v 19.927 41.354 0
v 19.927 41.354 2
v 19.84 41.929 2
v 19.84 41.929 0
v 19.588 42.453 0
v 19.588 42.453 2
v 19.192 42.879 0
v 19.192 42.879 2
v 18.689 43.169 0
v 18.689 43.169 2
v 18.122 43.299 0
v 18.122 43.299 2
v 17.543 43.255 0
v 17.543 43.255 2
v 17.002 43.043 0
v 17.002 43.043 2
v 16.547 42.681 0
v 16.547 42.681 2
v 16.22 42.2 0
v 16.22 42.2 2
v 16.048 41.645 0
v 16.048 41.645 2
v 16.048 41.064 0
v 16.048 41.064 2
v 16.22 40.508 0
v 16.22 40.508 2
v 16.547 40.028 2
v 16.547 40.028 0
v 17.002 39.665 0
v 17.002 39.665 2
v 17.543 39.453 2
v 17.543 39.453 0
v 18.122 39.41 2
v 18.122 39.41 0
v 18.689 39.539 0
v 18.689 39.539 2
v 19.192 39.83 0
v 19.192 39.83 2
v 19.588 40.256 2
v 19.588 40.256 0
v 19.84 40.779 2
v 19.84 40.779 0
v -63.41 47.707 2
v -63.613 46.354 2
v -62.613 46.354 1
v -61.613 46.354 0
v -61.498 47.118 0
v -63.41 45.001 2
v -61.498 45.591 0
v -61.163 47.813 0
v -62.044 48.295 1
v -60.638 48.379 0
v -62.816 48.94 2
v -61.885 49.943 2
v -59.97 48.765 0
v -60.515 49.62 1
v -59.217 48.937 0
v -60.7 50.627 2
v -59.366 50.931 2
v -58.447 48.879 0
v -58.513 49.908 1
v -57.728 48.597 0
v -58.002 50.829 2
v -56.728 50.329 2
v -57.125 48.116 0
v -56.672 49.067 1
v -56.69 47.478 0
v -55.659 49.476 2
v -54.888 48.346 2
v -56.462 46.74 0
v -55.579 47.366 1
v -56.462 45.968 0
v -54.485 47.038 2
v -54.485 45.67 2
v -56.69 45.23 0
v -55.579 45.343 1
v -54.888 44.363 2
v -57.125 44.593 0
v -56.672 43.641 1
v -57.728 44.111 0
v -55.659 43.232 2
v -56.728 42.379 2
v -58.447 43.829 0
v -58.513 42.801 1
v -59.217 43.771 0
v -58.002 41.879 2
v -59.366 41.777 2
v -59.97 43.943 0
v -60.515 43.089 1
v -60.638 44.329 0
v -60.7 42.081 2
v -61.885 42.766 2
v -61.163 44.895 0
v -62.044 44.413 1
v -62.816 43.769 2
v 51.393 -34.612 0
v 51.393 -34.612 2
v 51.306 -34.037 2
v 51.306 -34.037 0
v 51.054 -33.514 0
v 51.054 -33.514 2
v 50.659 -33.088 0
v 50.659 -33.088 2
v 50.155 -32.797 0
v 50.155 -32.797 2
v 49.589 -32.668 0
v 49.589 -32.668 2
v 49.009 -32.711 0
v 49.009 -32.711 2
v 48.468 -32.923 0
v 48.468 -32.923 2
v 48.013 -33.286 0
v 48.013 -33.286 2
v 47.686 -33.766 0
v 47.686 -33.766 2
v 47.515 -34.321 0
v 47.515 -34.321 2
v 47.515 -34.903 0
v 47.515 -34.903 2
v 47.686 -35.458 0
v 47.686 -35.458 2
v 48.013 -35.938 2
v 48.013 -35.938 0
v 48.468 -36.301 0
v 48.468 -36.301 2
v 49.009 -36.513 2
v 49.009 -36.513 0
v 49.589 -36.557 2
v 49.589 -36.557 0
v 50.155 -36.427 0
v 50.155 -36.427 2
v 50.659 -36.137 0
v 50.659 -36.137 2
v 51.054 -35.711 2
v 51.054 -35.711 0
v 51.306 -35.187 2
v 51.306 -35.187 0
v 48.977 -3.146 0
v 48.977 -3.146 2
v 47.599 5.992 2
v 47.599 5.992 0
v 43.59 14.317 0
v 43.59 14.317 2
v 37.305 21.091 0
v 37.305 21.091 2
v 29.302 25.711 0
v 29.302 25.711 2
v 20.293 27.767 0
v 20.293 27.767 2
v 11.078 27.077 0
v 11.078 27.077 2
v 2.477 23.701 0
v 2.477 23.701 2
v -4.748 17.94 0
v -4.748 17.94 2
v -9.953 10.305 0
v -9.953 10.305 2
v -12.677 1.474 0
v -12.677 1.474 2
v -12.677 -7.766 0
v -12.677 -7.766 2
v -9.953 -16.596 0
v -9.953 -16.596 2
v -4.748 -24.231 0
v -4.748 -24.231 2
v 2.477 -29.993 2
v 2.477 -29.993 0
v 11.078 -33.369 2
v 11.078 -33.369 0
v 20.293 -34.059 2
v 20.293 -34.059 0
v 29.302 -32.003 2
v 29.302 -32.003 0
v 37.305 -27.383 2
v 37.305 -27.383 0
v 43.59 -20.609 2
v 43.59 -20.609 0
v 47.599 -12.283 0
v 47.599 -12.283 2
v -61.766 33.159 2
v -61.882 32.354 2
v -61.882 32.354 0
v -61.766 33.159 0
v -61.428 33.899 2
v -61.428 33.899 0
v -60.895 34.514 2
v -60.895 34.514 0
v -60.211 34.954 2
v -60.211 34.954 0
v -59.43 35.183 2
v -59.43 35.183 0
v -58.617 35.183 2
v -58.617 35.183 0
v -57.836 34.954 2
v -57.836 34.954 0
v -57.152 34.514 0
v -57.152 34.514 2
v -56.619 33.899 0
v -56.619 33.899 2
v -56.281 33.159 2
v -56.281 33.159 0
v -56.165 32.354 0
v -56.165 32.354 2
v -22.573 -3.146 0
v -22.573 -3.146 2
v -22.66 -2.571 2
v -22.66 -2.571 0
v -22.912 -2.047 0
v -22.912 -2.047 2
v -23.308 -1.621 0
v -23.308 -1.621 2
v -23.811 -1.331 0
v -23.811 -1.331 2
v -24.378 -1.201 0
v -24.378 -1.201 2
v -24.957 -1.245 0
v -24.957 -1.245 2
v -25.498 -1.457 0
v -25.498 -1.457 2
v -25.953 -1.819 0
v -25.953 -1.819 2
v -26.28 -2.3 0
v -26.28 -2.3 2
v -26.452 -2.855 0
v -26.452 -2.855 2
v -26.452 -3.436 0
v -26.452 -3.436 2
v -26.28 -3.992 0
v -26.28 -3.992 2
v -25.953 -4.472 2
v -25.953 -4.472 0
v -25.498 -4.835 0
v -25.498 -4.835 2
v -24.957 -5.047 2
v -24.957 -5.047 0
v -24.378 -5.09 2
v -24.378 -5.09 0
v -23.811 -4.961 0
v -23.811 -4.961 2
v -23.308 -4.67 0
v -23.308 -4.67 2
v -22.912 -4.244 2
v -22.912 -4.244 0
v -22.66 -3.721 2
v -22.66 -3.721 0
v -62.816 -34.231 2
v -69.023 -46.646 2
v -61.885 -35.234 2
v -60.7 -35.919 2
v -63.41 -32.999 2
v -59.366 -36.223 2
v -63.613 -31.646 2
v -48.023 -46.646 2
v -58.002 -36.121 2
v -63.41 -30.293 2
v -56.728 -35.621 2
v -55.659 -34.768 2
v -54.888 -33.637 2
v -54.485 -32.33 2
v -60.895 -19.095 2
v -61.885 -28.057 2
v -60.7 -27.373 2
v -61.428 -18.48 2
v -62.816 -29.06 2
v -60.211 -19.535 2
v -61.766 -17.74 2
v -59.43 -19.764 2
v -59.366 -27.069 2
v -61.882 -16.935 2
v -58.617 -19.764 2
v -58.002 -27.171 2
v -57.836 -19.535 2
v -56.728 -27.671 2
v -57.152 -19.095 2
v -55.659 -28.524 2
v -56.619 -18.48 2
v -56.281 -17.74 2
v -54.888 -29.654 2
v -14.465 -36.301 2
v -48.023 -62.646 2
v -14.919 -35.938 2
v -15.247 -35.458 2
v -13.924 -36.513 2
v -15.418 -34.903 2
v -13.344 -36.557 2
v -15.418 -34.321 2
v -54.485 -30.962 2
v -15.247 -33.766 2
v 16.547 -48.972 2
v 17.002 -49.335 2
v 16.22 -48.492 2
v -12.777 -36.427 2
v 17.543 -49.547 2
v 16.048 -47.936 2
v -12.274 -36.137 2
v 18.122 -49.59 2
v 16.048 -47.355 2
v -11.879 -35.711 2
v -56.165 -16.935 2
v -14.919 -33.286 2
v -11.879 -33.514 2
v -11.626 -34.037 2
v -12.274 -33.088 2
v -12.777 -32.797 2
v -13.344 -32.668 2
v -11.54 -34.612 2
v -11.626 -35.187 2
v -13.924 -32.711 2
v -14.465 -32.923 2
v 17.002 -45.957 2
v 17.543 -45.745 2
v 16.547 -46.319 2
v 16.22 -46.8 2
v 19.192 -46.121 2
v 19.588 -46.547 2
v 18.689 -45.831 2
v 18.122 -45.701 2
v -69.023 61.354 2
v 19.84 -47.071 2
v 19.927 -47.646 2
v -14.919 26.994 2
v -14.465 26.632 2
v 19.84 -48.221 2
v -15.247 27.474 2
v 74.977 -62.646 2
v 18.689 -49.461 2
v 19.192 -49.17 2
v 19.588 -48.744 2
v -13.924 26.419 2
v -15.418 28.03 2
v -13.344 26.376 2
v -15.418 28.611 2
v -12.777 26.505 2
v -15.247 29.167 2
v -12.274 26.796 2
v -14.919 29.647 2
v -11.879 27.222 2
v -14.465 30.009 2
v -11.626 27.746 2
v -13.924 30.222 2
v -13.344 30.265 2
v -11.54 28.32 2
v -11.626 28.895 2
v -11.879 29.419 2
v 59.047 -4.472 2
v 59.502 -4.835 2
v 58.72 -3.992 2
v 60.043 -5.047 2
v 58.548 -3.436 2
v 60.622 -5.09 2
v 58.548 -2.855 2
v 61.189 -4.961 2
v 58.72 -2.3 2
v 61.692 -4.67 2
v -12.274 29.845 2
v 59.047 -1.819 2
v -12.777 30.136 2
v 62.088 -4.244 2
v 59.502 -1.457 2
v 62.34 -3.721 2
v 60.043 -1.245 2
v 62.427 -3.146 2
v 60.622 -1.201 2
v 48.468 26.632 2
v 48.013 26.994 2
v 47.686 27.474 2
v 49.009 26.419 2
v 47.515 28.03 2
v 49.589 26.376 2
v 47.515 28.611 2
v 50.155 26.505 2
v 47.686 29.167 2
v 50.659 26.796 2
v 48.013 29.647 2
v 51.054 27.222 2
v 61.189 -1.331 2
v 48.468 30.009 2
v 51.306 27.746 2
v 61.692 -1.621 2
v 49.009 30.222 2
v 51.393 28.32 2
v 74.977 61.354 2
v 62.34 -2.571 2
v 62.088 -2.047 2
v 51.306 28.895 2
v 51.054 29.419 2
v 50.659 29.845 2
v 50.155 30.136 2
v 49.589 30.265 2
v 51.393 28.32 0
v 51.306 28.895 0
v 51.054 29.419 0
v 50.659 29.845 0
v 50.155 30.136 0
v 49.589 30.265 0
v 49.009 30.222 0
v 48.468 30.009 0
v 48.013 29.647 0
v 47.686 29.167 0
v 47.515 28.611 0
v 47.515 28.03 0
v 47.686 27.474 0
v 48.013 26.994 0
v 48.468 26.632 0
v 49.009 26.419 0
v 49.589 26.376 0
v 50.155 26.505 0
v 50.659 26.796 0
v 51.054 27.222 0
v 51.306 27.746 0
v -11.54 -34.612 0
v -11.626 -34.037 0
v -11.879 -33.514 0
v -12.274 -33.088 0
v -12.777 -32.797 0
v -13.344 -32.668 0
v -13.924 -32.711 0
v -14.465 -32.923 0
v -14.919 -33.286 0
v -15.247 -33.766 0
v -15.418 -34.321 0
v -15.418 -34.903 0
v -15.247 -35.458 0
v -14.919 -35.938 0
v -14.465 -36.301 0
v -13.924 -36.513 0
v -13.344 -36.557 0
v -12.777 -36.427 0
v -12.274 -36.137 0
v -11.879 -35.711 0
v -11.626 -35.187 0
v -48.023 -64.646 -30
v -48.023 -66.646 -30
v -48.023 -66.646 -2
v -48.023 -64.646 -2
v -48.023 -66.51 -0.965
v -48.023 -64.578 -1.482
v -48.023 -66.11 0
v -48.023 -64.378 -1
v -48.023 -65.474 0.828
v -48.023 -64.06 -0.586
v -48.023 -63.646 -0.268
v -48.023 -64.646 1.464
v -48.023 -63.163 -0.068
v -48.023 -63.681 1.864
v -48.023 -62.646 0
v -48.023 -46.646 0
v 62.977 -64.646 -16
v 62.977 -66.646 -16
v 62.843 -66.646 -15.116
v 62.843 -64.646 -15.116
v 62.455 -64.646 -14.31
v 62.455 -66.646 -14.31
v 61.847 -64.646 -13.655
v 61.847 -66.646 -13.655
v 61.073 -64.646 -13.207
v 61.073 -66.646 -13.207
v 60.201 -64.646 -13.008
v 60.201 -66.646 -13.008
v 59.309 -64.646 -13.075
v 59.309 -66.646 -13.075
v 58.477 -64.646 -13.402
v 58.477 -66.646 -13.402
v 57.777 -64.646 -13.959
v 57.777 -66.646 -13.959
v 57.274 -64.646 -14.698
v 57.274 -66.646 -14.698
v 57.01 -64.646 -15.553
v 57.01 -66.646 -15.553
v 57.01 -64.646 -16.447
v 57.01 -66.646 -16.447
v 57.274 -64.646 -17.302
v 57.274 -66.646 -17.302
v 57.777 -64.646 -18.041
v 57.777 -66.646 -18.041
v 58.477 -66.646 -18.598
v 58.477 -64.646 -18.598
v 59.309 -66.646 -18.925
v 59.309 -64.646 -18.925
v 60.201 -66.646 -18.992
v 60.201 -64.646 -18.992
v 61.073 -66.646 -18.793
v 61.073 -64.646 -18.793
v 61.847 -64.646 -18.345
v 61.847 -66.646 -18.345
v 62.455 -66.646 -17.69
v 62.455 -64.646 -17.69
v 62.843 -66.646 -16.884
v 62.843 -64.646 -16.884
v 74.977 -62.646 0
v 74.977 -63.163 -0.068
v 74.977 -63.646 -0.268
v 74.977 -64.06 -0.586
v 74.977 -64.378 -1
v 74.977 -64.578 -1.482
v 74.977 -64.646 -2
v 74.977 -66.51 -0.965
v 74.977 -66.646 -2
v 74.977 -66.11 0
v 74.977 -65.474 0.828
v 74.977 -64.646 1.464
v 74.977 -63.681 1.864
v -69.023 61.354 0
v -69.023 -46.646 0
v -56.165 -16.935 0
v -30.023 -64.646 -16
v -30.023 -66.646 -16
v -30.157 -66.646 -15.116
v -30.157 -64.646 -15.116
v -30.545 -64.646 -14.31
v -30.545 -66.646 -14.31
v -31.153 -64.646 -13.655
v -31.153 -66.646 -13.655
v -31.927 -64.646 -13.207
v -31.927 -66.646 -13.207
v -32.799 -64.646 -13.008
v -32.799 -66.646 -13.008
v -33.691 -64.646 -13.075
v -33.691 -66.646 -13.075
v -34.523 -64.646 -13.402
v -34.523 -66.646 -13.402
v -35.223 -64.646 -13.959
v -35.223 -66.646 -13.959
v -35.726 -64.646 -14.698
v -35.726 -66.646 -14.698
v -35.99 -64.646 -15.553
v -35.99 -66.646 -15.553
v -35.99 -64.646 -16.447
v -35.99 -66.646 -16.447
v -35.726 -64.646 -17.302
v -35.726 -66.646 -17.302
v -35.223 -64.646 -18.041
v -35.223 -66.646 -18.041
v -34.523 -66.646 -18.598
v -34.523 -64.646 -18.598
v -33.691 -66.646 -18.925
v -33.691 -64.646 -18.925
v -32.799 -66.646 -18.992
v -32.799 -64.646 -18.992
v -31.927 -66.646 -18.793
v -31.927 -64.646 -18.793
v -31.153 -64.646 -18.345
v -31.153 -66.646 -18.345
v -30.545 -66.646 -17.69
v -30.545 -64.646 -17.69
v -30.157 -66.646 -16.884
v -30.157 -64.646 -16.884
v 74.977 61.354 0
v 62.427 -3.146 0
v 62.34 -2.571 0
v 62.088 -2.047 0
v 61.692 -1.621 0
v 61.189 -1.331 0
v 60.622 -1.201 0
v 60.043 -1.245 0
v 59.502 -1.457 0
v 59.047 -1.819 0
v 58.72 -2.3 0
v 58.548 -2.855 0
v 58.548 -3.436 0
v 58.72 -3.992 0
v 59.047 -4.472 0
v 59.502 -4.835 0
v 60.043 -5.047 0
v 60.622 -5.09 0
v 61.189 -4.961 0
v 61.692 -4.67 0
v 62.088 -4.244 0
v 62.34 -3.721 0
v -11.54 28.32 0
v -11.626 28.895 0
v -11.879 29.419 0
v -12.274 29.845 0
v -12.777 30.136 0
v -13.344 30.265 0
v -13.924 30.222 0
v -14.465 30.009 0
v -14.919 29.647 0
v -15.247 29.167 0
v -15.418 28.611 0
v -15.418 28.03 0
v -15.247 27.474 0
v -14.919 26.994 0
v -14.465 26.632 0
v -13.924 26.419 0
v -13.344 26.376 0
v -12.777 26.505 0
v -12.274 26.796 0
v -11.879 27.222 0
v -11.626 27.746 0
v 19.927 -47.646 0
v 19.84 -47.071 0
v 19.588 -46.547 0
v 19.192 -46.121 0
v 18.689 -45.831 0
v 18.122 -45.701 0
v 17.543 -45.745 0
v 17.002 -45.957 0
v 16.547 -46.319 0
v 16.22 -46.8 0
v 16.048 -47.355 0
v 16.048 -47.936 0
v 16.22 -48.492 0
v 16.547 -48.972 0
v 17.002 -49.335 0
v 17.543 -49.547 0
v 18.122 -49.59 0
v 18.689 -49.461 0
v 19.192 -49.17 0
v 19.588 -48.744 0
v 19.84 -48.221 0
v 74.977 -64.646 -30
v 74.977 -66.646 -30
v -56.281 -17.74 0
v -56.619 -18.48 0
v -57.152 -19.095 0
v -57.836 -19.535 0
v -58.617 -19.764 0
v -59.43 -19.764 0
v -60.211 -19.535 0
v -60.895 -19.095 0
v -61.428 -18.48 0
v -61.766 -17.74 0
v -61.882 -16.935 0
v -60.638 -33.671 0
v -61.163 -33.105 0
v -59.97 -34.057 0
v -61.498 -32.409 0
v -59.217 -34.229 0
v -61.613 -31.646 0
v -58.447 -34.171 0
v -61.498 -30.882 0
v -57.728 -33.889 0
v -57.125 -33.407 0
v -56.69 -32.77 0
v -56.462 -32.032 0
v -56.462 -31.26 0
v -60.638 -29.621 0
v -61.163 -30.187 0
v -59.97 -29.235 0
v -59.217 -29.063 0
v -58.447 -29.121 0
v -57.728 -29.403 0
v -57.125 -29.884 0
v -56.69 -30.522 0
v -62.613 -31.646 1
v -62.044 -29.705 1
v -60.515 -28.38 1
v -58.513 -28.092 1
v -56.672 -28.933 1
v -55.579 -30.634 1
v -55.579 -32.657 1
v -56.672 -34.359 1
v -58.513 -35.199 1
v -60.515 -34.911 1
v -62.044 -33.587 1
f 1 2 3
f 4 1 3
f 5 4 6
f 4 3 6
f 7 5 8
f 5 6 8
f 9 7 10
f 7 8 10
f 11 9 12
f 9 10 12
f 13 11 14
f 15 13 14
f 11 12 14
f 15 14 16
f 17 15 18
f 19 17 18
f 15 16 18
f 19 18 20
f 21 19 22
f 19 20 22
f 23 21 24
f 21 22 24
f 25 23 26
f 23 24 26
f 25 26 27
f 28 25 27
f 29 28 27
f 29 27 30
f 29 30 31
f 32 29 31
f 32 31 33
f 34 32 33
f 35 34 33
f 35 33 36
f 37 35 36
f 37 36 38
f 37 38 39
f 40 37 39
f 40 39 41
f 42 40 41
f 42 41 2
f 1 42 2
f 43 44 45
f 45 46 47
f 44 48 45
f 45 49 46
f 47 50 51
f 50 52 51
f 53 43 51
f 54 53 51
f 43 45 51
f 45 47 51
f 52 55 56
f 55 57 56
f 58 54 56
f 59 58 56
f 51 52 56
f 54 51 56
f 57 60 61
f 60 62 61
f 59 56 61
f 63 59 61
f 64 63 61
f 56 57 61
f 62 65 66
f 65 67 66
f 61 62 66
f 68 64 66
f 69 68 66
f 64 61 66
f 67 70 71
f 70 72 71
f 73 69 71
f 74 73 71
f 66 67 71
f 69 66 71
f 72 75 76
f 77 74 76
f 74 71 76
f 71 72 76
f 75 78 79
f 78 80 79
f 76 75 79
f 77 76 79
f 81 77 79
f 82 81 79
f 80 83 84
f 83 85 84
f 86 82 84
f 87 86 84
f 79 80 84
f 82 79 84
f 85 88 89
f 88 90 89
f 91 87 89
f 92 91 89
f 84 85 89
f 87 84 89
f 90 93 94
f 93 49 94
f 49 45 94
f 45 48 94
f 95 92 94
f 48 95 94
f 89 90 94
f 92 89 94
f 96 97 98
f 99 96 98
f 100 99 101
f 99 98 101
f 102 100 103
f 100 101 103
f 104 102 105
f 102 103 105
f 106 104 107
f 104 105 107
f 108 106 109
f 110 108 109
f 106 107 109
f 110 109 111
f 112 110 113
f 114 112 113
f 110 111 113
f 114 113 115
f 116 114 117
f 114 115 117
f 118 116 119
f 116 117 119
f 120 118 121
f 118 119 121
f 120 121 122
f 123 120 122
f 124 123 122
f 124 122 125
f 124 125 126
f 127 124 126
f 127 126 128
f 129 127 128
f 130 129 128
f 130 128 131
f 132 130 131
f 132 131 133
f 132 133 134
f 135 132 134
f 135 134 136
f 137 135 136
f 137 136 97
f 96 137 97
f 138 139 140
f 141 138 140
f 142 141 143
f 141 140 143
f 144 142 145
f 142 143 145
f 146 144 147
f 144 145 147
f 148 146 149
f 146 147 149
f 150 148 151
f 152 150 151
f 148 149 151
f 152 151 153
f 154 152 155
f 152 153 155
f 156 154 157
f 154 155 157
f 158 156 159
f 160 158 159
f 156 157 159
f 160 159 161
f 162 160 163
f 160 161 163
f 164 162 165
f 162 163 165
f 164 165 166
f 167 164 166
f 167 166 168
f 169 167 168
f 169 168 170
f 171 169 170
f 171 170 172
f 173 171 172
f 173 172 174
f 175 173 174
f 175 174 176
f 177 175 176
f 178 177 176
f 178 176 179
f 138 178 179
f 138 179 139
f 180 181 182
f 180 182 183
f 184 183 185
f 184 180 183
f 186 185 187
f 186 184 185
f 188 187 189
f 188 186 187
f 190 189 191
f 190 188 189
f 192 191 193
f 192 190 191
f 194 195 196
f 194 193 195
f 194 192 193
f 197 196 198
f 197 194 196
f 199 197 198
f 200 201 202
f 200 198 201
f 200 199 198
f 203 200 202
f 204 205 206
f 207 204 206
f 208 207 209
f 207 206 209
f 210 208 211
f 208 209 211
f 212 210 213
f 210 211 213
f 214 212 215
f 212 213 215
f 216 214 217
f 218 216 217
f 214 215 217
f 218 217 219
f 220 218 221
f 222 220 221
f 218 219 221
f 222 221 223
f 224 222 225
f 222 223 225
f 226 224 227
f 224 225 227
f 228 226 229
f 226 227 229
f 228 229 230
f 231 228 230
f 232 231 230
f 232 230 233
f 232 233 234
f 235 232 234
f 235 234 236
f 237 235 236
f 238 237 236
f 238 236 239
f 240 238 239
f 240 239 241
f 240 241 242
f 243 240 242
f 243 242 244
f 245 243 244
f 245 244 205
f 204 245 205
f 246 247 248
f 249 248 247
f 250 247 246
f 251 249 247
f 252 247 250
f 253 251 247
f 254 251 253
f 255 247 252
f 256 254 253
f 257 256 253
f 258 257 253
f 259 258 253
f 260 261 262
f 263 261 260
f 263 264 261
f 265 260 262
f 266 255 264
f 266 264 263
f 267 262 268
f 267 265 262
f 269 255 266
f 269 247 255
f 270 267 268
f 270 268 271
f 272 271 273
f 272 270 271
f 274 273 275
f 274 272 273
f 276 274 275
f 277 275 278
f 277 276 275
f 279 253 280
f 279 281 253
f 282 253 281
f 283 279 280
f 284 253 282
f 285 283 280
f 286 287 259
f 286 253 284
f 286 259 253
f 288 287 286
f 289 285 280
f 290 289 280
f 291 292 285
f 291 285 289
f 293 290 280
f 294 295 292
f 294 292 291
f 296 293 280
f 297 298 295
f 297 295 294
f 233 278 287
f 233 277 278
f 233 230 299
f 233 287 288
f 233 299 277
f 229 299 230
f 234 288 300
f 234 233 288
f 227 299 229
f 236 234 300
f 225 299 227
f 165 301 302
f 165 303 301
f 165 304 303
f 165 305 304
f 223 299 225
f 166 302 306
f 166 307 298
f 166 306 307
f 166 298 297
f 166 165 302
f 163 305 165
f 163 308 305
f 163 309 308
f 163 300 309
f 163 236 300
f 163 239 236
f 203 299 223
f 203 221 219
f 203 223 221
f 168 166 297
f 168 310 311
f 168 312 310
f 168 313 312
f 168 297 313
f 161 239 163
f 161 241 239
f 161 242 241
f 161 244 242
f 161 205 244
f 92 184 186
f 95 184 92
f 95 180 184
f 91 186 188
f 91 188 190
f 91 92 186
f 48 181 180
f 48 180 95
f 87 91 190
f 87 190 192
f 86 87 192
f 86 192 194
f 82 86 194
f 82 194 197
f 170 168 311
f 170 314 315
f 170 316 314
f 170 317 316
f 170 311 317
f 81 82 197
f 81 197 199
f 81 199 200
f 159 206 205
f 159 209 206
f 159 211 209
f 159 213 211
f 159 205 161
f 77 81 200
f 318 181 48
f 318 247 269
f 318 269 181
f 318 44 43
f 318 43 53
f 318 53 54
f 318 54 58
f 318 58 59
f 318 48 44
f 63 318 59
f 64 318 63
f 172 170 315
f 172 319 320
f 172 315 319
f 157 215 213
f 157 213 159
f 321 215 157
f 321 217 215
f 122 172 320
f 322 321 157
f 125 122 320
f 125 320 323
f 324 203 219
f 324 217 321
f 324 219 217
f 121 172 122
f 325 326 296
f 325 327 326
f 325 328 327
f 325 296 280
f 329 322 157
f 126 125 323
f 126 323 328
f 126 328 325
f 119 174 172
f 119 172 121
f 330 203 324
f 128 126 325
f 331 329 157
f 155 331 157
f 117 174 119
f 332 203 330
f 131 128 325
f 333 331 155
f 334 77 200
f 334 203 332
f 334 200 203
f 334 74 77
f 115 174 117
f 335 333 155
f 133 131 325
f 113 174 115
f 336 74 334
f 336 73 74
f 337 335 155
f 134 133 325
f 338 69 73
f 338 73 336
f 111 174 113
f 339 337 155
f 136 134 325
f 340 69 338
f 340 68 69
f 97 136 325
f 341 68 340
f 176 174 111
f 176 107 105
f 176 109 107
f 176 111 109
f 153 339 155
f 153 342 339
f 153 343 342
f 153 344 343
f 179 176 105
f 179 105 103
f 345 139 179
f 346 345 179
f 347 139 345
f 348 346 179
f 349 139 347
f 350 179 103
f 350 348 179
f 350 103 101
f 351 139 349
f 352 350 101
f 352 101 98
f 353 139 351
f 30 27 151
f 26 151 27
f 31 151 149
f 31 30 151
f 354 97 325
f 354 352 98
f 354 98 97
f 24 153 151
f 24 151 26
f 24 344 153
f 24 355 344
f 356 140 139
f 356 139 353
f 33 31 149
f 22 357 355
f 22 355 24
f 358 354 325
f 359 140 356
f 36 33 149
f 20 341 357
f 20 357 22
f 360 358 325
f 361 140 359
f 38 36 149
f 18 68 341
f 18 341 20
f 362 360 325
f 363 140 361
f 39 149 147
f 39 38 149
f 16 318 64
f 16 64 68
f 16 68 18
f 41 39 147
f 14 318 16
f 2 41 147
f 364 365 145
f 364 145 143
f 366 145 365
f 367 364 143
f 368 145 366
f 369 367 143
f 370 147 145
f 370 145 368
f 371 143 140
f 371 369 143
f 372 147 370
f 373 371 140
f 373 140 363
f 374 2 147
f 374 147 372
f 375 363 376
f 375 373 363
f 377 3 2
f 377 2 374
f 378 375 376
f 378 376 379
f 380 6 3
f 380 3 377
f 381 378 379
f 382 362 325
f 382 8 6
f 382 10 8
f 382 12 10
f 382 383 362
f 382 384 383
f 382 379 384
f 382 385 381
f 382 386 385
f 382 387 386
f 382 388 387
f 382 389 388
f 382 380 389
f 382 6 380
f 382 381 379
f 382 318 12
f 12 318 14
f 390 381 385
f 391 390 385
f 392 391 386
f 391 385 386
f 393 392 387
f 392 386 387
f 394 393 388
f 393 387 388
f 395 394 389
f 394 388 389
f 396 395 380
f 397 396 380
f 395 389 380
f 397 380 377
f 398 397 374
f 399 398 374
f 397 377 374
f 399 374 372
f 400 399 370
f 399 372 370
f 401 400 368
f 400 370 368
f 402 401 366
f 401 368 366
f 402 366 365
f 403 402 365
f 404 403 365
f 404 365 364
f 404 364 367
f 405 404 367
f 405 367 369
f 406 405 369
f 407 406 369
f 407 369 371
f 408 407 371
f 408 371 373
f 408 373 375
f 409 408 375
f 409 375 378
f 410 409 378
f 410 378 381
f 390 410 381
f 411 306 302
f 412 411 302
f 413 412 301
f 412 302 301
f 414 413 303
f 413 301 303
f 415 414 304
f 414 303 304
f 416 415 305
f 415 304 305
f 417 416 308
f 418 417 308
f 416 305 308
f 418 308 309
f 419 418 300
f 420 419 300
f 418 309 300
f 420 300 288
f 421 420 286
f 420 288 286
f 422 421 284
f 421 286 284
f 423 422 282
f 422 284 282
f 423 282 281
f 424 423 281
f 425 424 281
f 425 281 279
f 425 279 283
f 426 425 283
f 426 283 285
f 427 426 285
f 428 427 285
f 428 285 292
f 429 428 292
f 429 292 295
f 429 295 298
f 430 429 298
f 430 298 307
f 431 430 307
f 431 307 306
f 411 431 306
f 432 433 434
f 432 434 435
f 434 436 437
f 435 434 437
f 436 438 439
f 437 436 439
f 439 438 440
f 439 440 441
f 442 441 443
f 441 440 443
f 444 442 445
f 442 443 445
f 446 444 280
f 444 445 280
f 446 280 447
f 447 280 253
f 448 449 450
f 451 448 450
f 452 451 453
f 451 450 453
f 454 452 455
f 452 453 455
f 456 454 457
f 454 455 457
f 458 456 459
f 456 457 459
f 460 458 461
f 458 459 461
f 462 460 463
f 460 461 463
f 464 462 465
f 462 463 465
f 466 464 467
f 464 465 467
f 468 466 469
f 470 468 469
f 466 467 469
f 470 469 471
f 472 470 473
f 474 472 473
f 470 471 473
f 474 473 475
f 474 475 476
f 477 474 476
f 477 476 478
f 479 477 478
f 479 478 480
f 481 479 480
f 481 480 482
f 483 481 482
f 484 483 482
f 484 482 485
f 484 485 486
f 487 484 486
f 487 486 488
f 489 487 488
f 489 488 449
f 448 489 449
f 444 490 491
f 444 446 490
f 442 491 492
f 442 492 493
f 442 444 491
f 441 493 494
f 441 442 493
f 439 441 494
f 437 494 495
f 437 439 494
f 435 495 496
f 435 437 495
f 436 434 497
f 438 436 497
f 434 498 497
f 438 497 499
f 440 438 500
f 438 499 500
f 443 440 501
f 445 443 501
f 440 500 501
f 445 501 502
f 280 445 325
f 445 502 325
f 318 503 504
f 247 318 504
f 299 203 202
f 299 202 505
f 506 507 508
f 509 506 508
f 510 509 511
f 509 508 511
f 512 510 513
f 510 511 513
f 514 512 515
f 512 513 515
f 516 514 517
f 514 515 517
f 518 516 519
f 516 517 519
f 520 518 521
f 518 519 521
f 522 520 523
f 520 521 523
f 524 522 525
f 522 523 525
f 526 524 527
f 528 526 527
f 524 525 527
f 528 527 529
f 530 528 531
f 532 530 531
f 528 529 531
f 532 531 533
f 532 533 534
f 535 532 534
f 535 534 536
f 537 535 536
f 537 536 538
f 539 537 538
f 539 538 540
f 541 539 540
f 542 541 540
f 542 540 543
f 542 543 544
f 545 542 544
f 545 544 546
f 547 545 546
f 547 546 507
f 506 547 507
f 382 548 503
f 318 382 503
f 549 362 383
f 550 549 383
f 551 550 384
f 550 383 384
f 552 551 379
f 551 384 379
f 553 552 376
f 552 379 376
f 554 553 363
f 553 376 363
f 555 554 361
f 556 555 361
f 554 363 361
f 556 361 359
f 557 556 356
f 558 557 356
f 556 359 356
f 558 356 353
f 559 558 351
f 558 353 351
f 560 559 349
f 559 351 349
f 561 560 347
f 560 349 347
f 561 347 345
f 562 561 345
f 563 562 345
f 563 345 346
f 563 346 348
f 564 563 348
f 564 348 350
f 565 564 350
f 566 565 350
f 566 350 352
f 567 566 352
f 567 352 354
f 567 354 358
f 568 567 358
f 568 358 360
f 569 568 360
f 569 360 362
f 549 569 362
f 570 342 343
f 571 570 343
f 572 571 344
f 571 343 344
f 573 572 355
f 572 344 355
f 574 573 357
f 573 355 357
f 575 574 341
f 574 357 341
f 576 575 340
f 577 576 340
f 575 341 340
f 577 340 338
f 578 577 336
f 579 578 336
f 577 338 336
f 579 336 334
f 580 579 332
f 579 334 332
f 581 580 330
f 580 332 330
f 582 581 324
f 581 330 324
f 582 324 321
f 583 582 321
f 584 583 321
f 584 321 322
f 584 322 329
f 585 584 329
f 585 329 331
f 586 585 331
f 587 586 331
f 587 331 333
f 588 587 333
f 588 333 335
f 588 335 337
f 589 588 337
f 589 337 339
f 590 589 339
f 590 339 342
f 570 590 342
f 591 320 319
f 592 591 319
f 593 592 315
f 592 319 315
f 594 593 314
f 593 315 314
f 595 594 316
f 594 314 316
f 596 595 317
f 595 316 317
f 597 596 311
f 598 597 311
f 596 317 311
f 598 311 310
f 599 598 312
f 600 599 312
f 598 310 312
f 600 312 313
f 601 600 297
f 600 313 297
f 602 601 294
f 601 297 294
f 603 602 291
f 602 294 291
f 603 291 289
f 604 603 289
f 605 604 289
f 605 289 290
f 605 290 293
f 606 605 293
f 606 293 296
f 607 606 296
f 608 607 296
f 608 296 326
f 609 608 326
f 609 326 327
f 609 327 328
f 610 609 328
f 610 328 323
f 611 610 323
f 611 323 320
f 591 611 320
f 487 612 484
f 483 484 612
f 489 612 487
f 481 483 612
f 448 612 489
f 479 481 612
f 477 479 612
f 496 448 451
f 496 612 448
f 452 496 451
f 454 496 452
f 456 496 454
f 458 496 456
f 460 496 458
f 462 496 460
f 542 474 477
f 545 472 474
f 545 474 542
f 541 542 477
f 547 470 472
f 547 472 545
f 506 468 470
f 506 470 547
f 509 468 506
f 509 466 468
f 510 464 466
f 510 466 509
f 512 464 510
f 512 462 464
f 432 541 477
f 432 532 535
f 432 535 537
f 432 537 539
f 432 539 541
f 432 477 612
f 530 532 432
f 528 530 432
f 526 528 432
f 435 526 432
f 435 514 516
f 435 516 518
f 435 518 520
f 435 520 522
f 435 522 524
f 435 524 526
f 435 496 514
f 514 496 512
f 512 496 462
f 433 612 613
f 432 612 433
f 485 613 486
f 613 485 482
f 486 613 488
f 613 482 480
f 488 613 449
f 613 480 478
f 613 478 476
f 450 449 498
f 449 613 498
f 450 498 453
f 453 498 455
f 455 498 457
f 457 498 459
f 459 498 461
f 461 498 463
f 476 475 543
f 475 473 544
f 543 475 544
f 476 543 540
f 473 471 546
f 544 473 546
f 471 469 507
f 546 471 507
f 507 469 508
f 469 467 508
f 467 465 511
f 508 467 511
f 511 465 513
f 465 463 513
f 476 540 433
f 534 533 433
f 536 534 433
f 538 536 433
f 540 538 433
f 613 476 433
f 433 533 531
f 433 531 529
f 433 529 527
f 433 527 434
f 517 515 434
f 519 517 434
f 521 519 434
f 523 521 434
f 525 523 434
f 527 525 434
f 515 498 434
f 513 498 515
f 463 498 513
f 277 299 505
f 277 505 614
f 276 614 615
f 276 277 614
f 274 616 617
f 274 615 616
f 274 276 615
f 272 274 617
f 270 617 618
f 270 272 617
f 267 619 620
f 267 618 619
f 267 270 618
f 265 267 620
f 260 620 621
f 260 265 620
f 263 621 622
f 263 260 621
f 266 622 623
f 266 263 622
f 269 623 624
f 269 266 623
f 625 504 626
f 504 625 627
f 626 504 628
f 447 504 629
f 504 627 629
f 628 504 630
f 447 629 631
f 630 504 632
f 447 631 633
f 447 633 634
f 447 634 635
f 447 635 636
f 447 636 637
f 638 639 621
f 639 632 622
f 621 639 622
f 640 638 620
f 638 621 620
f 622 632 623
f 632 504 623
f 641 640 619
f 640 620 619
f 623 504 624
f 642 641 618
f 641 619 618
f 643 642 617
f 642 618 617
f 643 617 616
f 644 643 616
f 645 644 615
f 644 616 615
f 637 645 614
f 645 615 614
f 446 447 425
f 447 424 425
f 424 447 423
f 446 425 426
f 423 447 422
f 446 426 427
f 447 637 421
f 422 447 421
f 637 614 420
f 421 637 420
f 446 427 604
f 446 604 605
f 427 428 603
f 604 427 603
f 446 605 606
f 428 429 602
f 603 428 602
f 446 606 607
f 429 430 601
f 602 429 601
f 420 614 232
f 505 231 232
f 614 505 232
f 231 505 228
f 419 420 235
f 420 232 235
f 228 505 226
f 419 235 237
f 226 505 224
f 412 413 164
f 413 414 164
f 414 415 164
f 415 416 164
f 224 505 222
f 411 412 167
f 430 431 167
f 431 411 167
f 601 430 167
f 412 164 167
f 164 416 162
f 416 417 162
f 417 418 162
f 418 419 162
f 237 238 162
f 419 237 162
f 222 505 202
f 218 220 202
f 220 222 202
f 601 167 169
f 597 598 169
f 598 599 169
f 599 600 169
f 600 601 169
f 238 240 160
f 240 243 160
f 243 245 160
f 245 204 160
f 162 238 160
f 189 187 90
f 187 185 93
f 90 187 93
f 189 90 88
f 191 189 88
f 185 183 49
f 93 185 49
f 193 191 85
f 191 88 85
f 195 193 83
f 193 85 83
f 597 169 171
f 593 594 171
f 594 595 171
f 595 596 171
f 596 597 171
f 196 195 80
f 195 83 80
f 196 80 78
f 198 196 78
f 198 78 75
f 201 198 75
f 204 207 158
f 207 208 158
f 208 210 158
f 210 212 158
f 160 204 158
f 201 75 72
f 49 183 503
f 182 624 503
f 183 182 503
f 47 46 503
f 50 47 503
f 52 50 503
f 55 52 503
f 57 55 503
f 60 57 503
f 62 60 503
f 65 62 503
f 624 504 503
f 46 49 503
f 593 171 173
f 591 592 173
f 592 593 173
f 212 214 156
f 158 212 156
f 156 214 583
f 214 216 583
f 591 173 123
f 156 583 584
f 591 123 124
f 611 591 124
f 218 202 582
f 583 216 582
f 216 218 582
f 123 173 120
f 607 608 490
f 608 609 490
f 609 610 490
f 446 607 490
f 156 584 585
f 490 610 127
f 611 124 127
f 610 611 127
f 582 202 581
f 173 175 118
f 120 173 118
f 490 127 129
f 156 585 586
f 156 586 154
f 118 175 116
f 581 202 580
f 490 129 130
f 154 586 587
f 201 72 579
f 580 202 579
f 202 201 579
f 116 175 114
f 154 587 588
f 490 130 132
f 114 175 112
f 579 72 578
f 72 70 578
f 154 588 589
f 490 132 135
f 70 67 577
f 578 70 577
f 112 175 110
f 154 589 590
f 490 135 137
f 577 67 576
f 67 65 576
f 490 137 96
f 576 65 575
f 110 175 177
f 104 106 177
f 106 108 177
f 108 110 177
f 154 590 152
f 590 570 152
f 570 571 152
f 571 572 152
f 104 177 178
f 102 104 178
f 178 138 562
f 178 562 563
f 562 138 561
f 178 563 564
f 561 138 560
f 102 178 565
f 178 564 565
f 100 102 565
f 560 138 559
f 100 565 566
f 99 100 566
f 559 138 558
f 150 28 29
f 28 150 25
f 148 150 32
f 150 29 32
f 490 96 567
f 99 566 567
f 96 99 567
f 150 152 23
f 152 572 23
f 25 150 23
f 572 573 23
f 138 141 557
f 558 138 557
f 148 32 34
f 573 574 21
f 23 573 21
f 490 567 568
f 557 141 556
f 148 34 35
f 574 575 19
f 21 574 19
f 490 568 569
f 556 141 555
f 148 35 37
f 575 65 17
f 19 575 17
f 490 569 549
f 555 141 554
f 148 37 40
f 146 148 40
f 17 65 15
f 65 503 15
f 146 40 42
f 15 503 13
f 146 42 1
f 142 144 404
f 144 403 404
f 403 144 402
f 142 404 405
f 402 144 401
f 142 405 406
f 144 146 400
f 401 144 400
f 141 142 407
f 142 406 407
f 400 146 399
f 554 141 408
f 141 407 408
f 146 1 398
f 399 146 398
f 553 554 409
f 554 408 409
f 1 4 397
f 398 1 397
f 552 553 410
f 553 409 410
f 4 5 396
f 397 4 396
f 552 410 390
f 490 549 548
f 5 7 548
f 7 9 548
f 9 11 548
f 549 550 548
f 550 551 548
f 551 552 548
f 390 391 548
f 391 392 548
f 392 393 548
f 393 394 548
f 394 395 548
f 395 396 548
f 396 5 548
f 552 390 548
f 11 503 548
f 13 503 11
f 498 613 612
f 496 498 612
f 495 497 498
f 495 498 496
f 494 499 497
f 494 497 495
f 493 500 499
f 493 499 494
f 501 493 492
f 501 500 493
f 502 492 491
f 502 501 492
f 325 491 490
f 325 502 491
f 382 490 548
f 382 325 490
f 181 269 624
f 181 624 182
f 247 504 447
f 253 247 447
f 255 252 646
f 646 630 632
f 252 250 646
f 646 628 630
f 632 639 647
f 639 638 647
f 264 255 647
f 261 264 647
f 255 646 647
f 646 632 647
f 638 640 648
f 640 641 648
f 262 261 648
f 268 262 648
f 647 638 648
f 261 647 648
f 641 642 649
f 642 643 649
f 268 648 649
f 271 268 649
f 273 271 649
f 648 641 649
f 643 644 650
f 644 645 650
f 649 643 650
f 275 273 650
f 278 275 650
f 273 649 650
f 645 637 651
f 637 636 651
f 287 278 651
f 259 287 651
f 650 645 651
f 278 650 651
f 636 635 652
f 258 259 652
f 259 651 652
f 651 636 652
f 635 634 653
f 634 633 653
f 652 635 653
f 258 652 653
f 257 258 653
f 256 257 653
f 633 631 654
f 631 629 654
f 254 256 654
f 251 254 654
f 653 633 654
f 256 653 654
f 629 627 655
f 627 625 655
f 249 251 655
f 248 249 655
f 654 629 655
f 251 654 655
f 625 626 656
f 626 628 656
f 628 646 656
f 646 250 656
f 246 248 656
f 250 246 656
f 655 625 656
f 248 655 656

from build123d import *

# Parameters (mm, degrees)
AUFSATZ_LINEAR_AUSTRAGEN1_DEPTH                      = 2
SKIZZE2_W                                            = 123
SKIZZE2_H                                            = 2
AUFSATZ_LINEAR_AUSTRAGEN2_DEPTH                      = 30
VERRUNDUNG1_R                                        = 2
VERRUNDUNG2_R                                        = 4
SKIZZE3_R                                            = 3
SCHNITT_LINEAR_AUSTRAGEN1_DEPTH                      = 152.345576266
FORMSENKUNG_F_R_M4_SENKSCHRAUBE_MIT_INNE_D           = 4.5
FORMSENKUNG_F_R_M4_SENKSCHRAUBE_MIT_INNE_DEPTH       = 11.94
FORMSENKUNG_F_R_M4_SENKSCHRAUBE_MIT_INNE_CSINK_D     = 9.18
FORMSENKUNG_F_R_M4_SENKSCHRAUBE_MIT_INNE_CSINK_ANGLE = 90
FORMSENKUNG_F_R_M4_SENKSCHRAUBE_MIT_INNE_TIP         = 1.351936393
SKIZZE7_R                                            = 1.95
SKIZZE7_R_2                                          = 31
SCHNITT_LINEAR_AUSTRAGEN2_DEPTH                      = 106.295533596


with BuildPart() as part:
    # Skizze1 → Aufsatz-Linear austragen1 (new body)
    with BuildSketch(Plane.XY):
        Polygon((-69.023447297, -46.645824625), (-48.023447297, -46.645824625), (-48.023447297, -66.645824625), (74.976552703, -66.645824625), (74.976552703, 61.354175375), (-69.023447297, 61.354175375), align=None)
    extrude(amount=AUFSATZ_LINEAR_AUSTRAGEN1_DEPTH)

    # Skizze2 → Aufsatz-Linear austragen2 (add)
    with BuildSketch(Plane(origin=(0, 0, 0), x_dir=(-1, 0, 0), z_dir=(0, 0, -1))):
        with Locations((-13.476552703, -65.645824625)):
            Rectangle(SKIZZE2_W, SKIZZE2_H)
    extrude(amount=AUFSATZ_LINEAR_AUSTRAGEN2_DEPTH)

    # Verrundung1
    verrundung1_edges = [part.edges().sort_by_distance(p)[0] for p in [
        (13.476552703, -64.645824625, 0),
    ]]
    fillet(verrundung1_edges, radius=VERRUNDUNG1_R)

    # Verrundung2
    verrundung2_edges = [part.edges().sort_by_distance(p)[0] for p in [
        (13.476552703, -66.645824625, 2),
    ]]
    fillet(verrundung2_edges, radius=VERRUNDUNG2_R)

    # Skizze3 → Schnitt-Linear austragen1 (cut, through all)
    with BuildSketch(Plane.XZ.offset(66.645824625)):
        with Locations((-33.023447297, -16)):
            Circle(SKIZZE3_R)
        with Locations((59.976552703, -16)):
            Circle(SKIZZE3_R)
    extrude(amount=-SCHNITT_LINEAR_AUSTRAGEN1_DEPTH, mode=Mode.SUBTRACT)

    # Formsenkung für M4 Senkschraube mit Innensechskant1
    with Locations(Plane.XY.offset(2)):
        with Locations((-59.023447297, -31.645824625), (-59.023447297, 46.354175375)):
            CounterSinkHole(FORMSENKUNG_F_R_M4_SENKSCHRAUBE_MIT_INNE_D / 2, FORMSENKUNG_F_R_M4_SENKSCHRAUBE_MIT_INNE_CSINK_D / 2, depth=FORMSENKUNG_F_R_M4_SENKSCHRAUBE_MIT_INNE_DEPTH, counter_sink_angle=FORMSENKUNG_F_R_M4_SENKSCHRAUBE_MIT_INNE_CSINK_ANGLE)
            with Locations((0, 0, -(FORMSENKUNG_F_R_M4_SENKSCHRAUBE_MIT_INNE_DEPTH + FORMSENKUNG_F_R_M4_SENKSCHRAUBE_MIT_INNE_TIP / 2))):  # 118° drill point
                Cone(0, FORMSENKUNG_F_R_M4_SENKSCHRAUBE_MIT_INNE_D / 2, FORMSENKUNG_F_R_M4_SENKSCHRAUBE_MIT_INNE_TIP, mode=Mode.SUBTRACT)

    # Skizze7 → Schnitt-Linear austragen2 (cut, through all)
    with BuildSketch(Plane.XY.offset(2)):
        with Locations((17.976552703, 41.354175375)):
            Circle(SKIZZE7_R)
        with Locations((49.442804466, 28.320427137)):
            Circle(SKIZZE7_R)
        with Locations((49.442804466, -34.612076388)):
            Circle(SKIZZE7_R)
        with Locations((17.976552703, -47.645824625)):
            Circle(SKIZZE7_R)
        with Locations((-13.489699059, -34.612076388)):
            Circle(SKIZZE7_R)
        with Locations((-13.489699059, 28.320427137)):
            Circle(SKIZZE7_R)
        with Locations((17.976552703, -3.145824625)):
            Circle(SKIZZE7_R_2)
        with Locations((-24.523447297, -3.145824625)):
            Circle(SKIZZE7_R)
        with Locations((60.476552703, -3.145824625)):
            Circle(SKIZZE7_R)
        with BuildLine():
            Line((-61.881657041, -16.935182234), (-61.881657041, 32.354175375))
            ThreePointArc((-61.881657041, 32.354175375), (-59.023447297, 35.212385119), (-56.165237552, 32.354175375))
            Line((-56.165237552, 32.354175375), (-56.165237552, -16.935182234))
            ThreePointArc((-56.165237552, -16.935182234), (-59.023447297, -19.793391979), (-61.881657041, -16.935182234))
        make_face()
    extrude(amount=-SCHNITT_LINEAR_AUSTRAGEN2_DEPTH, mode=Mode.SUBTRACT)


solid = part.part
